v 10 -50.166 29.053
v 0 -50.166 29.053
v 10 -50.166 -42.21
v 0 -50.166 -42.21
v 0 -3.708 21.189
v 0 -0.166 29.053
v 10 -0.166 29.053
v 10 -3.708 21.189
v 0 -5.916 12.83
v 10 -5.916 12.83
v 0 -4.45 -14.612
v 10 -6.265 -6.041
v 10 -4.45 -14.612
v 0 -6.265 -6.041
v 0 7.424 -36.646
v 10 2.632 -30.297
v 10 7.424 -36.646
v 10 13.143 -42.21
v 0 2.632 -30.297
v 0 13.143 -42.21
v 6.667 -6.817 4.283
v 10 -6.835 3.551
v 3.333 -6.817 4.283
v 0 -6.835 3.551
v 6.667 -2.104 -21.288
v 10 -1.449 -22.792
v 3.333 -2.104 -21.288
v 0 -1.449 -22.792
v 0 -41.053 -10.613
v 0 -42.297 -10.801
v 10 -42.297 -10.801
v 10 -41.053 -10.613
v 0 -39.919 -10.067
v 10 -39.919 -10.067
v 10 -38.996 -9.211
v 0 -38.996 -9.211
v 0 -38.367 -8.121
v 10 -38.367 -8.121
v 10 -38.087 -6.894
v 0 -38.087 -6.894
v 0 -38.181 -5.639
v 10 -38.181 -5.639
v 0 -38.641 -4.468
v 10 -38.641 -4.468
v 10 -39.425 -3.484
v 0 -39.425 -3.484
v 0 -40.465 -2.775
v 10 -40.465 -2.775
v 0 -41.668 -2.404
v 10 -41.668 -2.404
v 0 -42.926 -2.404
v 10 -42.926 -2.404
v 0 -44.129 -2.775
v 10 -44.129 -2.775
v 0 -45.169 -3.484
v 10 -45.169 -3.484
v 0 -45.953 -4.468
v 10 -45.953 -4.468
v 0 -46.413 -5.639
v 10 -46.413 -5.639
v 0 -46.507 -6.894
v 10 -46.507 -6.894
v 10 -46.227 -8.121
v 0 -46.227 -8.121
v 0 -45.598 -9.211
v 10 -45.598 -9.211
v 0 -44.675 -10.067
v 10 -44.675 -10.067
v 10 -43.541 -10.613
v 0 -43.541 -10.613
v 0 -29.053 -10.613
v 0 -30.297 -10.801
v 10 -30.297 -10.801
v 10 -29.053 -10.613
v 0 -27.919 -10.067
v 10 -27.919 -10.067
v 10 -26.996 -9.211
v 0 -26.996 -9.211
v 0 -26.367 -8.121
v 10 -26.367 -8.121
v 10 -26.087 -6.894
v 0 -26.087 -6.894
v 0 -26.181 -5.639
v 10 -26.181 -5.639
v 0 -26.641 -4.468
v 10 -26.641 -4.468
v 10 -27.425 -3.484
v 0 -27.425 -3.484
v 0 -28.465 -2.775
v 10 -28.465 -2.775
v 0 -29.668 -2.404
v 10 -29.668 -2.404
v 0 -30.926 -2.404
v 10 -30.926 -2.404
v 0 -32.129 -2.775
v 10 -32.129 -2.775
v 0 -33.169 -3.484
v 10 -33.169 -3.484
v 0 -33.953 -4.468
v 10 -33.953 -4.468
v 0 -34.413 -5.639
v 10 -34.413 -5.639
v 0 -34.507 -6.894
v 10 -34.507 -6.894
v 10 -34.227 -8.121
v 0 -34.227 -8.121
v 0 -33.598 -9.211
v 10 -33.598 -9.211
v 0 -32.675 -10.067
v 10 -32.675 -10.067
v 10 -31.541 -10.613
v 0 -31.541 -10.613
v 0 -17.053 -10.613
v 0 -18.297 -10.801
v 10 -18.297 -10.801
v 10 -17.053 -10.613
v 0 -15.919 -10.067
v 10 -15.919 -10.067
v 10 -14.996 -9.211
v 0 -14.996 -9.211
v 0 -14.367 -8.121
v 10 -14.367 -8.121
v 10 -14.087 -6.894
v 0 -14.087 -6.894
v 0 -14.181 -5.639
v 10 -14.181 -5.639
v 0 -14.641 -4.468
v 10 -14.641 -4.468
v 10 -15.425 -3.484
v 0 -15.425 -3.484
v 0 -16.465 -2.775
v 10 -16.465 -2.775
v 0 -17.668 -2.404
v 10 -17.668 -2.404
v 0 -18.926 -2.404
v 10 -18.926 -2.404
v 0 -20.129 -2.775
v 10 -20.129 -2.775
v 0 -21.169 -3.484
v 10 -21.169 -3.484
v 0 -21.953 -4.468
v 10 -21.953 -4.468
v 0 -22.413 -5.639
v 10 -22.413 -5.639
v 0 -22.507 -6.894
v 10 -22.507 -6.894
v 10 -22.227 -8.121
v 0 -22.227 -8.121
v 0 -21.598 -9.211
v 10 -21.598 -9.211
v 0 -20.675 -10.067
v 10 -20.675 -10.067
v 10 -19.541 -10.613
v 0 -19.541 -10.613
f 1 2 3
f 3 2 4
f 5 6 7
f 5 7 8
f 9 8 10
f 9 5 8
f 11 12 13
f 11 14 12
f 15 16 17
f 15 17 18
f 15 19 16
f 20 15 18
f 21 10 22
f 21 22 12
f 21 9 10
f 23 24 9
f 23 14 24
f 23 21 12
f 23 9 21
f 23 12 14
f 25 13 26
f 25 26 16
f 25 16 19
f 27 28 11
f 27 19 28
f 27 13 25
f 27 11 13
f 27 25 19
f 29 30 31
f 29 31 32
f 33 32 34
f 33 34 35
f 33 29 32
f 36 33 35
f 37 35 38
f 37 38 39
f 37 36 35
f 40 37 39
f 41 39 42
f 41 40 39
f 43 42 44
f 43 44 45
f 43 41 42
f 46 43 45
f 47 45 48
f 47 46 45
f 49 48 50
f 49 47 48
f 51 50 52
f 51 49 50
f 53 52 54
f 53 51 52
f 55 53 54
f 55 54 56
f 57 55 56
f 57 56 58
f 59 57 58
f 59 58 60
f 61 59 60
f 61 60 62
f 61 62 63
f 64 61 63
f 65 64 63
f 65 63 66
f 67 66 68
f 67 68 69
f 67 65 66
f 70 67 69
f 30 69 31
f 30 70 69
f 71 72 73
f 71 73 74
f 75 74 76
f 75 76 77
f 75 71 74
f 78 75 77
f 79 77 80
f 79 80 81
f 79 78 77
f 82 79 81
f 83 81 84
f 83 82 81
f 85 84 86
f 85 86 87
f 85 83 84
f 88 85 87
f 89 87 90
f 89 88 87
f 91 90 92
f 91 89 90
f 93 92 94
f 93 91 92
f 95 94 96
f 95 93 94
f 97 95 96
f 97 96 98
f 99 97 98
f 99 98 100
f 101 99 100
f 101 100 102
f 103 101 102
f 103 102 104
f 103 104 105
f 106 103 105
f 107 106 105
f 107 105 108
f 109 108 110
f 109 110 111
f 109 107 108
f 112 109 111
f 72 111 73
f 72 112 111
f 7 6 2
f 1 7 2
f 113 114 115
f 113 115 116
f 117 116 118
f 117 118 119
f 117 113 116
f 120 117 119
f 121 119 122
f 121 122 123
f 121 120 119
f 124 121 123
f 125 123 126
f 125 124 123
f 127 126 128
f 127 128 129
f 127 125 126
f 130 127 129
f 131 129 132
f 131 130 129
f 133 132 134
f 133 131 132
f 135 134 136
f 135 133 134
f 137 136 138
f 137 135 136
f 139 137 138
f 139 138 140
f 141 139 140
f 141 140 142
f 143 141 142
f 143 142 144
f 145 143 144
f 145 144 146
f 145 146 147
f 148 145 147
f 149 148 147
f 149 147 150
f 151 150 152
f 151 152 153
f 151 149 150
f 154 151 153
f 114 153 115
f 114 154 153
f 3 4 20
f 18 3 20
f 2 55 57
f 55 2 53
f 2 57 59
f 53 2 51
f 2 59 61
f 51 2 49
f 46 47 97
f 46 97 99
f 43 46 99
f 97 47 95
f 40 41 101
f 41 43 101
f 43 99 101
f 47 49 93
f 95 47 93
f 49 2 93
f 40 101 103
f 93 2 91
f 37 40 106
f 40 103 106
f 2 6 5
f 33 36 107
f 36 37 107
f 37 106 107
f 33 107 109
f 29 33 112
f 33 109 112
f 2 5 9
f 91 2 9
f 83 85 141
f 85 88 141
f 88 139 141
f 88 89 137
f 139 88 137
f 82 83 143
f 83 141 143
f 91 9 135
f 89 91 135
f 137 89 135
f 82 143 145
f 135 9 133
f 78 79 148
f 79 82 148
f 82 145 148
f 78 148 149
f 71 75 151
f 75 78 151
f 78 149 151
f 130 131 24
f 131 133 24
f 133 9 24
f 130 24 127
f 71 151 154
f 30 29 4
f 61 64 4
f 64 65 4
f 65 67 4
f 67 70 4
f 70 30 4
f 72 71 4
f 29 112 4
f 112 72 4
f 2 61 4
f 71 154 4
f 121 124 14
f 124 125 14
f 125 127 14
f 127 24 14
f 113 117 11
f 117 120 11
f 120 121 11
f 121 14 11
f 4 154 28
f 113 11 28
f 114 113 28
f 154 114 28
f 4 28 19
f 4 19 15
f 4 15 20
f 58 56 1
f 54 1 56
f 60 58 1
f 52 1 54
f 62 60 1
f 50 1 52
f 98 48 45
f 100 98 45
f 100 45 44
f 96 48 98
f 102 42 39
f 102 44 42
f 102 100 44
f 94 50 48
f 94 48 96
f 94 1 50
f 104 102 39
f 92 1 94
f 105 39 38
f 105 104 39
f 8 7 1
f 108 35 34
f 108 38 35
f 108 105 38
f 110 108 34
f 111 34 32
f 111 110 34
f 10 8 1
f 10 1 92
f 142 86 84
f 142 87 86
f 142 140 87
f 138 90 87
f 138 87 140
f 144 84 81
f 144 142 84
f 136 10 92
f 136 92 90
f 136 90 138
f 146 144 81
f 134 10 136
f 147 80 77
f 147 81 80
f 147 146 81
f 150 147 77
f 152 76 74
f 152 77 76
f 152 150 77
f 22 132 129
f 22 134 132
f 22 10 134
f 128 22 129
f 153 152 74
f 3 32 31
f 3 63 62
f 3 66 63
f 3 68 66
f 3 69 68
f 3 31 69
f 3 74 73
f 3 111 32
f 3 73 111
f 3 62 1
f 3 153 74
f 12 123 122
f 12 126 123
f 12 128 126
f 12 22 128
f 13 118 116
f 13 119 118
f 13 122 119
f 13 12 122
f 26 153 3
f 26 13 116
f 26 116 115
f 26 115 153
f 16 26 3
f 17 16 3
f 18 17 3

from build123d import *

# Parameters (mm, degrees)
SKETCH1_R           = 4.221837906
BOSS_EXTRUDE1_DEPTH = 10


with BuildPart() as part:
    # Sketch1 → Boss-Extrude1 (new body)
    with BuildSketch(Plane(origin=(0, 0, 0), x_dir=(0, 0, -1), z_dir=(1, 0, 0))):
        with BuildLine():
            Line((-29.05259943, -0.165516433), (-29.05259943, -50.165516433))
            Line((-29.05259943, -50.165516433), (42.210436172, -50.165516433))
            Line((42.210436172, -50.165516433), (42.210436172, 13.142555632))
            add(Edge.make_bspline(
                [(-29.05259943, -0.165516433), (-6.499992704, -12.774809737), (25.427672134, -7.094962856), (42.210436172, 13.142555632)],
                knots=[0, 0, 0, 0, 1, 1, 1, 1], degree=3))
        make_face()
        with Locations((6.578918371, -42.29705463)):
            Circle(SKETCH1_R, mode=Mode.SUBTRACT)
        with Locations((6.578918371, -30.29705463)):
            Circle(SKETCH1_R, mode=Mode.SUBTRACT)
        with Locations((6.578918371, -18.29705463)):
            Circle(SKETCH1_R, mode=Mode.SUBTRACT)
    extrude(amount=BOSS_EXTRUDE1_DEPTH)


solid = part.part
